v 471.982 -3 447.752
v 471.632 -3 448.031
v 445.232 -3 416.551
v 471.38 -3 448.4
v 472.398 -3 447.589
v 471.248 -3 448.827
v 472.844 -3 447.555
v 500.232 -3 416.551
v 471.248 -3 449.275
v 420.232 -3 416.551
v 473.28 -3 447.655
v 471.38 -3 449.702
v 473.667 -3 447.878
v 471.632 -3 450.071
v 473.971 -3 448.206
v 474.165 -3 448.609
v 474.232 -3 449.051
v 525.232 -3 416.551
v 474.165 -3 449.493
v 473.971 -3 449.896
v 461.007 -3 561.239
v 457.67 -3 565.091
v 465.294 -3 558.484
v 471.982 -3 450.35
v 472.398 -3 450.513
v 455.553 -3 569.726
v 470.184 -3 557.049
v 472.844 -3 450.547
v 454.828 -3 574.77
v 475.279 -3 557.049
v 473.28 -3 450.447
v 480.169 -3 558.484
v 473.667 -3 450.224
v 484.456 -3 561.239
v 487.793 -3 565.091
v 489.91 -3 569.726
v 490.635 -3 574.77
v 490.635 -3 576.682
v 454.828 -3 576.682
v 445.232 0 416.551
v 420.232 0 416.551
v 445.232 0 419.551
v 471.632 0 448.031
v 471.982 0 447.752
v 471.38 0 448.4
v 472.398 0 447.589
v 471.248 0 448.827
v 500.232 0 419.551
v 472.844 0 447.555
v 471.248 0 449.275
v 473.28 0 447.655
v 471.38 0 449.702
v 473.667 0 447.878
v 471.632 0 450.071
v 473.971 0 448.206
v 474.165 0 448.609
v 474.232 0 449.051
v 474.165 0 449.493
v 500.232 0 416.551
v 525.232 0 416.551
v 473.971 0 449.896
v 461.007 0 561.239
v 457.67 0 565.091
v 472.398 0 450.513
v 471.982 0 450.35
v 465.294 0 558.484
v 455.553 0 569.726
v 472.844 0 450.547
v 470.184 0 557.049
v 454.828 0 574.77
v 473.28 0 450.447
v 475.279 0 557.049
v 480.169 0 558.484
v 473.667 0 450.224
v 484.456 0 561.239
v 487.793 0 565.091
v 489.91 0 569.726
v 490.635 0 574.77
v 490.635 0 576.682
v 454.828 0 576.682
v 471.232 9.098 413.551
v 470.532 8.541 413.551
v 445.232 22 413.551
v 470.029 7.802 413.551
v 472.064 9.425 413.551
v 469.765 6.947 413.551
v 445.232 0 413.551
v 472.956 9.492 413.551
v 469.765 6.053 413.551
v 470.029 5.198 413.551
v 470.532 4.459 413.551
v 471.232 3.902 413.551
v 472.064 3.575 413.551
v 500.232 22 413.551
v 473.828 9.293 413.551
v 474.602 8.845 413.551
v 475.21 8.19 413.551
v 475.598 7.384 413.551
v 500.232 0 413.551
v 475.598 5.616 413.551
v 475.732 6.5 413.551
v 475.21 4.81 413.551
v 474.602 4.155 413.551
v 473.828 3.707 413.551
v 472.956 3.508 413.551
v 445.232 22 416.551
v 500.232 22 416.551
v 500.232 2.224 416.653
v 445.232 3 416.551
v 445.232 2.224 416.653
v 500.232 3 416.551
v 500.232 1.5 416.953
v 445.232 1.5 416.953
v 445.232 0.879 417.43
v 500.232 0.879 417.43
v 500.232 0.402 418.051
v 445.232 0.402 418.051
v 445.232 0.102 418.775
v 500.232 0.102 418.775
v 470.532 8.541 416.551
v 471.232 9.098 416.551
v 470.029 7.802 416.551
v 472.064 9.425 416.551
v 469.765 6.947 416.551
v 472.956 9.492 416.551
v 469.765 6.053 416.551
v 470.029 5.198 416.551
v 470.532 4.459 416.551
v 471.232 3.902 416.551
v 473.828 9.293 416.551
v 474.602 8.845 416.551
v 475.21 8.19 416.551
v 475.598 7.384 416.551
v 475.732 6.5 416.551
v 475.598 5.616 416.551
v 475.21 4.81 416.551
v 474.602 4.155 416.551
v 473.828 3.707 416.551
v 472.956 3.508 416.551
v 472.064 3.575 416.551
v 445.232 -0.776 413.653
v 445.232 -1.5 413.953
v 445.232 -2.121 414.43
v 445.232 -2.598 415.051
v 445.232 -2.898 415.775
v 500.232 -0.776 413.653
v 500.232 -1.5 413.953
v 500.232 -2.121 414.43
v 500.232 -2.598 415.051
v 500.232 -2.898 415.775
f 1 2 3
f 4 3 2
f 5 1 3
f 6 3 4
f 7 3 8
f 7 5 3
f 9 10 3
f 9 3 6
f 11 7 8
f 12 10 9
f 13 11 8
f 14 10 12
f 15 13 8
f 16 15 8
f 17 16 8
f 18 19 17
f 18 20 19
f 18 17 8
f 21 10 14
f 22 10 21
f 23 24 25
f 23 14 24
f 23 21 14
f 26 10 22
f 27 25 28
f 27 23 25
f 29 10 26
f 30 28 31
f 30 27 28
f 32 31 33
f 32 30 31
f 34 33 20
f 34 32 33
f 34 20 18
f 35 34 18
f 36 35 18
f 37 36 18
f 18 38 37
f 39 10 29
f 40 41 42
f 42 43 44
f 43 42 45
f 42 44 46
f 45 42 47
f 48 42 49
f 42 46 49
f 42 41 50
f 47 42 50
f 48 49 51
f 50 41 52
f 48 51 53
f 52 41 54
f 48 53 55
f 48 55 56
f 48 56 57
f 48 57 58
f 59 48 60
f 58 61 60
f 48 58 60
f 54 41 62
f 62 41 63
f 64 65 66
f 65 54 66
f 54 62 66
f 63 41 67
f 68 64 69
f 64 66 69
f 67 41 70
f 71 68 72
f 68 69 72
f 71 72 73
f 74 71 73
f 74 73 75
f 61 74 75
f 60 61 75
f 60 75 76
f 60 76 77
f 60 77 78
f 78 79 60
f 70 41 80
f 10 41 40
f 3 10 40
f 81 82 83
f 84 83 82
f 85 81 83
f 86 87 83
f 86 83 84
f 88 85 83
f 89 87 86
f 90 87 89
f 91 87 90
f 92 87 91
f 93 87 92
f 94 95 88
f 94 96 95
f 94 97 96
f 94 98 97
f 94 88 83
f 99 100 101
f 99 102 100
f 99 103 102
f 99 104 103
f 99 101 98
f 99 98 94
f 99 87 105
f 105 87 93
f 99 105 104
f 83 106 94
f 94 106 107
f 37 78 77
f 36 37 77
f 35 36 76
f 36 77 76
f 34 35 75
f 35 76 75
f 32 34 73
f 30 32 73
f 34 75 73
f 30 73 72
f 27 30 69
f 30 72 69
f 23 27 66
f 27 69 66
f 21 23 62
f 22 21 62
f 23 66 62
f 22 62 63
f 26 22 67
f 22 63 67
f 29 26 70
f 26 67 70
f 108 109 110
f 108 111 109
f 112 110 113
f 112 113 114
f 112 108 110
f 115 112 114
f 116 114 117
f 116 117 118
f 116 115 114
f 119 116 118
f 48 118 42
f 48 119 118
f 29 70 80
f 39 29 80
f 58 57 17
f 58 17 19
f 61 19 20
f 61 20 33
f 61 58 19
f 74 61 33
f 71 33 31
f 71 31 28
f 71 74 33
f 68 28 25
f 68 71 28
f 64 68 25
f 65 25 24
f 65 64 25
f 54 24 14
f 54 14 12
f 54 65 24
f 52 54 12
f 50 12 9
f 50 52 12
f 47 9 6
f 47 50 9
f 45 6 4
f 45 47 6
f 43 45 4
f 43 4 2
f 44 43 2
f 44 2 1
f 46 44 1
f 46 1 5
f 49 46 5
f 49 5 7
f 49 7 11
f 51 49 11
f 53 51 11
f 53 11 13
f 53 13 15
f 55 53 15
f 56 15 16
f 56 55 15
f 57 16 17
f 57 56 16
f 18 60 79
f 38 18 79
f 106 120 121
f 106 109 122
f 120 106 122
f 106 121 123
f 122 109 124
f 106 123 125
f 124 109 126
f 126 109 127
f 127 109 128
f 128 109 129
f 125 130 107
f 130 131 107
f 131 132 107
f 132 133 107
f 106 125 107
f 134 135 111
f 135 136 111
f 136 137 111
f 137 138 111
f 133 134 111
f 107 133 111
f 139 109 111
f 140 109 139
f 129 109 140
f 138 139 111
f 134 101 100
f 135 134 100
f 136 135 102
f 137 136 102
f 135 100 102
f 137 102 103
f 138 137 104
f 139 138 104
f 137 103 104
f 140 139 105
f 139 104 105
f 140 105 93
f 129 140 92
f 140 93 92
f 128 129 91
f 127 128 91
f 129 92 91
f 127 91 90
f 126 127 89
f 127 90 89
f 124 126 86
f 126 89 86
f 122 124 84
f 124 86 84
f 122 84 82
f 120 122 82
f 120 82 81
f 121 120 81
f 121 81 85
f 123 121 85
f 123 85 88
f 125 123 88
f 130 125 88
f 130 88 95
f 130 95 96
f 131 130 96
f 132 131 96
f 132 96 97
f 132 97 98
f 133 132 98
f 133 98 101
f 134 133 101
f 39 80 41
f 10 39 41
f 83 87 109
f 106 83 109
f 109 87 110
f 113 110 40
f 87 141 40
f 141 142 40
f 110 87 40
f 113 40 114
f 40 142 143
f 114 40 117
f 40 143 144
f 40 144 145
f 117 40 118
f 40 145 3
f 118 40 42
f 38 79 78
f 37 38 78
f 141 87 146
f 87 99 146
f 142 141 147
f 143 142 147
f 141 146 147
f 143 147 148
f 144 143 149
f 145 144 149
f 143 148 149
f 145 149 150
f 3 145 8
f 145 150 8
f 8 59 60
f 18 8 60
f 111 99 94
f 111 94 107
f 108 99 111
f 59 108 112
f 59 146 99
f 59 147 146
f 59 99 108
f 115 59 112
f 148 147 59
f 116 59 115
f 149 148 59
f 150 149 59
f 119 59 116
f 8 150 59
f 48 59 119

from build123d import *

# Parameters (mm, degrees)
F0_R     = 1.5
F1_DEPTH = 3
F2_W     = 55
F2_H     = 3
F3_DEPTH = 25
F4_R     = 3
F5_R     = 3
F6_DEPTH = 163.1321276775


with BuildPart() as f1:
    # F0 (on Front) → F1 (new body)
    with BuildSketch(Plane.XZ):
        with BuildLine():
            Line((454.8277321524, 574.7700988736), (454.8277321524, 576.6820907487))
            Line((454.8277321524, 576.6820907487), (420.231500864, 416.5509630712))
            Line((420.231500864, 416.5509630712), (495.9500458773, 416.5509630712))
            Line((495.9500458773, 416.5509630712), (525.231500864, 416.5509630712))
            Line((525.231500864, 416.5509630712), (490.6352695757, 576.6820907487))
            Line((490.6352695757, 576.6820907487), (490.6352695757, 574.7700988736))
            ThreePointArc((490.6352695757, 574.7700988736), (472.731500864, 556.866330162), (454.8277321524, 574.7700988736))
        make_face()
        with Locations((472.731500864, 449.0509630712)):
            Circle(F0_R, mode=Mode.SUBTRACT)
    extrude(amount=F1_DEPTH)

    # F2 (on face) → F3 (join)
    with BuildSketch(Plane.XZ.offset(3)):
        with Locations((472.731500864, 415.0509630712)):
            Rectangle(F2_W, F2_H)
    extrude(amount=-F3_DEPTH)

    # F4
    f4_edges = [f1.edges().sort_by_distance(p)[0] for p in [
        (472.731501, -3, 413.550963),
        (472.731501, 0, 416.550963),
    ]]
    fillet(f4_edges, radius=F4_R)

    # F5 (on face) → F6 (cut, through all)
    with BuildSketch(Plane(origin=(0, 0, 413.5509630712), x_dir=(1, 0, 0), z_dir=(0, 0, -1))):
        with Locations((472.731500864, -6.5)):
            Circle(F5_R)
    extrude(amount=-F6_DEPTH, mode=Mode.SUBTRACT)


solid = f1.part
